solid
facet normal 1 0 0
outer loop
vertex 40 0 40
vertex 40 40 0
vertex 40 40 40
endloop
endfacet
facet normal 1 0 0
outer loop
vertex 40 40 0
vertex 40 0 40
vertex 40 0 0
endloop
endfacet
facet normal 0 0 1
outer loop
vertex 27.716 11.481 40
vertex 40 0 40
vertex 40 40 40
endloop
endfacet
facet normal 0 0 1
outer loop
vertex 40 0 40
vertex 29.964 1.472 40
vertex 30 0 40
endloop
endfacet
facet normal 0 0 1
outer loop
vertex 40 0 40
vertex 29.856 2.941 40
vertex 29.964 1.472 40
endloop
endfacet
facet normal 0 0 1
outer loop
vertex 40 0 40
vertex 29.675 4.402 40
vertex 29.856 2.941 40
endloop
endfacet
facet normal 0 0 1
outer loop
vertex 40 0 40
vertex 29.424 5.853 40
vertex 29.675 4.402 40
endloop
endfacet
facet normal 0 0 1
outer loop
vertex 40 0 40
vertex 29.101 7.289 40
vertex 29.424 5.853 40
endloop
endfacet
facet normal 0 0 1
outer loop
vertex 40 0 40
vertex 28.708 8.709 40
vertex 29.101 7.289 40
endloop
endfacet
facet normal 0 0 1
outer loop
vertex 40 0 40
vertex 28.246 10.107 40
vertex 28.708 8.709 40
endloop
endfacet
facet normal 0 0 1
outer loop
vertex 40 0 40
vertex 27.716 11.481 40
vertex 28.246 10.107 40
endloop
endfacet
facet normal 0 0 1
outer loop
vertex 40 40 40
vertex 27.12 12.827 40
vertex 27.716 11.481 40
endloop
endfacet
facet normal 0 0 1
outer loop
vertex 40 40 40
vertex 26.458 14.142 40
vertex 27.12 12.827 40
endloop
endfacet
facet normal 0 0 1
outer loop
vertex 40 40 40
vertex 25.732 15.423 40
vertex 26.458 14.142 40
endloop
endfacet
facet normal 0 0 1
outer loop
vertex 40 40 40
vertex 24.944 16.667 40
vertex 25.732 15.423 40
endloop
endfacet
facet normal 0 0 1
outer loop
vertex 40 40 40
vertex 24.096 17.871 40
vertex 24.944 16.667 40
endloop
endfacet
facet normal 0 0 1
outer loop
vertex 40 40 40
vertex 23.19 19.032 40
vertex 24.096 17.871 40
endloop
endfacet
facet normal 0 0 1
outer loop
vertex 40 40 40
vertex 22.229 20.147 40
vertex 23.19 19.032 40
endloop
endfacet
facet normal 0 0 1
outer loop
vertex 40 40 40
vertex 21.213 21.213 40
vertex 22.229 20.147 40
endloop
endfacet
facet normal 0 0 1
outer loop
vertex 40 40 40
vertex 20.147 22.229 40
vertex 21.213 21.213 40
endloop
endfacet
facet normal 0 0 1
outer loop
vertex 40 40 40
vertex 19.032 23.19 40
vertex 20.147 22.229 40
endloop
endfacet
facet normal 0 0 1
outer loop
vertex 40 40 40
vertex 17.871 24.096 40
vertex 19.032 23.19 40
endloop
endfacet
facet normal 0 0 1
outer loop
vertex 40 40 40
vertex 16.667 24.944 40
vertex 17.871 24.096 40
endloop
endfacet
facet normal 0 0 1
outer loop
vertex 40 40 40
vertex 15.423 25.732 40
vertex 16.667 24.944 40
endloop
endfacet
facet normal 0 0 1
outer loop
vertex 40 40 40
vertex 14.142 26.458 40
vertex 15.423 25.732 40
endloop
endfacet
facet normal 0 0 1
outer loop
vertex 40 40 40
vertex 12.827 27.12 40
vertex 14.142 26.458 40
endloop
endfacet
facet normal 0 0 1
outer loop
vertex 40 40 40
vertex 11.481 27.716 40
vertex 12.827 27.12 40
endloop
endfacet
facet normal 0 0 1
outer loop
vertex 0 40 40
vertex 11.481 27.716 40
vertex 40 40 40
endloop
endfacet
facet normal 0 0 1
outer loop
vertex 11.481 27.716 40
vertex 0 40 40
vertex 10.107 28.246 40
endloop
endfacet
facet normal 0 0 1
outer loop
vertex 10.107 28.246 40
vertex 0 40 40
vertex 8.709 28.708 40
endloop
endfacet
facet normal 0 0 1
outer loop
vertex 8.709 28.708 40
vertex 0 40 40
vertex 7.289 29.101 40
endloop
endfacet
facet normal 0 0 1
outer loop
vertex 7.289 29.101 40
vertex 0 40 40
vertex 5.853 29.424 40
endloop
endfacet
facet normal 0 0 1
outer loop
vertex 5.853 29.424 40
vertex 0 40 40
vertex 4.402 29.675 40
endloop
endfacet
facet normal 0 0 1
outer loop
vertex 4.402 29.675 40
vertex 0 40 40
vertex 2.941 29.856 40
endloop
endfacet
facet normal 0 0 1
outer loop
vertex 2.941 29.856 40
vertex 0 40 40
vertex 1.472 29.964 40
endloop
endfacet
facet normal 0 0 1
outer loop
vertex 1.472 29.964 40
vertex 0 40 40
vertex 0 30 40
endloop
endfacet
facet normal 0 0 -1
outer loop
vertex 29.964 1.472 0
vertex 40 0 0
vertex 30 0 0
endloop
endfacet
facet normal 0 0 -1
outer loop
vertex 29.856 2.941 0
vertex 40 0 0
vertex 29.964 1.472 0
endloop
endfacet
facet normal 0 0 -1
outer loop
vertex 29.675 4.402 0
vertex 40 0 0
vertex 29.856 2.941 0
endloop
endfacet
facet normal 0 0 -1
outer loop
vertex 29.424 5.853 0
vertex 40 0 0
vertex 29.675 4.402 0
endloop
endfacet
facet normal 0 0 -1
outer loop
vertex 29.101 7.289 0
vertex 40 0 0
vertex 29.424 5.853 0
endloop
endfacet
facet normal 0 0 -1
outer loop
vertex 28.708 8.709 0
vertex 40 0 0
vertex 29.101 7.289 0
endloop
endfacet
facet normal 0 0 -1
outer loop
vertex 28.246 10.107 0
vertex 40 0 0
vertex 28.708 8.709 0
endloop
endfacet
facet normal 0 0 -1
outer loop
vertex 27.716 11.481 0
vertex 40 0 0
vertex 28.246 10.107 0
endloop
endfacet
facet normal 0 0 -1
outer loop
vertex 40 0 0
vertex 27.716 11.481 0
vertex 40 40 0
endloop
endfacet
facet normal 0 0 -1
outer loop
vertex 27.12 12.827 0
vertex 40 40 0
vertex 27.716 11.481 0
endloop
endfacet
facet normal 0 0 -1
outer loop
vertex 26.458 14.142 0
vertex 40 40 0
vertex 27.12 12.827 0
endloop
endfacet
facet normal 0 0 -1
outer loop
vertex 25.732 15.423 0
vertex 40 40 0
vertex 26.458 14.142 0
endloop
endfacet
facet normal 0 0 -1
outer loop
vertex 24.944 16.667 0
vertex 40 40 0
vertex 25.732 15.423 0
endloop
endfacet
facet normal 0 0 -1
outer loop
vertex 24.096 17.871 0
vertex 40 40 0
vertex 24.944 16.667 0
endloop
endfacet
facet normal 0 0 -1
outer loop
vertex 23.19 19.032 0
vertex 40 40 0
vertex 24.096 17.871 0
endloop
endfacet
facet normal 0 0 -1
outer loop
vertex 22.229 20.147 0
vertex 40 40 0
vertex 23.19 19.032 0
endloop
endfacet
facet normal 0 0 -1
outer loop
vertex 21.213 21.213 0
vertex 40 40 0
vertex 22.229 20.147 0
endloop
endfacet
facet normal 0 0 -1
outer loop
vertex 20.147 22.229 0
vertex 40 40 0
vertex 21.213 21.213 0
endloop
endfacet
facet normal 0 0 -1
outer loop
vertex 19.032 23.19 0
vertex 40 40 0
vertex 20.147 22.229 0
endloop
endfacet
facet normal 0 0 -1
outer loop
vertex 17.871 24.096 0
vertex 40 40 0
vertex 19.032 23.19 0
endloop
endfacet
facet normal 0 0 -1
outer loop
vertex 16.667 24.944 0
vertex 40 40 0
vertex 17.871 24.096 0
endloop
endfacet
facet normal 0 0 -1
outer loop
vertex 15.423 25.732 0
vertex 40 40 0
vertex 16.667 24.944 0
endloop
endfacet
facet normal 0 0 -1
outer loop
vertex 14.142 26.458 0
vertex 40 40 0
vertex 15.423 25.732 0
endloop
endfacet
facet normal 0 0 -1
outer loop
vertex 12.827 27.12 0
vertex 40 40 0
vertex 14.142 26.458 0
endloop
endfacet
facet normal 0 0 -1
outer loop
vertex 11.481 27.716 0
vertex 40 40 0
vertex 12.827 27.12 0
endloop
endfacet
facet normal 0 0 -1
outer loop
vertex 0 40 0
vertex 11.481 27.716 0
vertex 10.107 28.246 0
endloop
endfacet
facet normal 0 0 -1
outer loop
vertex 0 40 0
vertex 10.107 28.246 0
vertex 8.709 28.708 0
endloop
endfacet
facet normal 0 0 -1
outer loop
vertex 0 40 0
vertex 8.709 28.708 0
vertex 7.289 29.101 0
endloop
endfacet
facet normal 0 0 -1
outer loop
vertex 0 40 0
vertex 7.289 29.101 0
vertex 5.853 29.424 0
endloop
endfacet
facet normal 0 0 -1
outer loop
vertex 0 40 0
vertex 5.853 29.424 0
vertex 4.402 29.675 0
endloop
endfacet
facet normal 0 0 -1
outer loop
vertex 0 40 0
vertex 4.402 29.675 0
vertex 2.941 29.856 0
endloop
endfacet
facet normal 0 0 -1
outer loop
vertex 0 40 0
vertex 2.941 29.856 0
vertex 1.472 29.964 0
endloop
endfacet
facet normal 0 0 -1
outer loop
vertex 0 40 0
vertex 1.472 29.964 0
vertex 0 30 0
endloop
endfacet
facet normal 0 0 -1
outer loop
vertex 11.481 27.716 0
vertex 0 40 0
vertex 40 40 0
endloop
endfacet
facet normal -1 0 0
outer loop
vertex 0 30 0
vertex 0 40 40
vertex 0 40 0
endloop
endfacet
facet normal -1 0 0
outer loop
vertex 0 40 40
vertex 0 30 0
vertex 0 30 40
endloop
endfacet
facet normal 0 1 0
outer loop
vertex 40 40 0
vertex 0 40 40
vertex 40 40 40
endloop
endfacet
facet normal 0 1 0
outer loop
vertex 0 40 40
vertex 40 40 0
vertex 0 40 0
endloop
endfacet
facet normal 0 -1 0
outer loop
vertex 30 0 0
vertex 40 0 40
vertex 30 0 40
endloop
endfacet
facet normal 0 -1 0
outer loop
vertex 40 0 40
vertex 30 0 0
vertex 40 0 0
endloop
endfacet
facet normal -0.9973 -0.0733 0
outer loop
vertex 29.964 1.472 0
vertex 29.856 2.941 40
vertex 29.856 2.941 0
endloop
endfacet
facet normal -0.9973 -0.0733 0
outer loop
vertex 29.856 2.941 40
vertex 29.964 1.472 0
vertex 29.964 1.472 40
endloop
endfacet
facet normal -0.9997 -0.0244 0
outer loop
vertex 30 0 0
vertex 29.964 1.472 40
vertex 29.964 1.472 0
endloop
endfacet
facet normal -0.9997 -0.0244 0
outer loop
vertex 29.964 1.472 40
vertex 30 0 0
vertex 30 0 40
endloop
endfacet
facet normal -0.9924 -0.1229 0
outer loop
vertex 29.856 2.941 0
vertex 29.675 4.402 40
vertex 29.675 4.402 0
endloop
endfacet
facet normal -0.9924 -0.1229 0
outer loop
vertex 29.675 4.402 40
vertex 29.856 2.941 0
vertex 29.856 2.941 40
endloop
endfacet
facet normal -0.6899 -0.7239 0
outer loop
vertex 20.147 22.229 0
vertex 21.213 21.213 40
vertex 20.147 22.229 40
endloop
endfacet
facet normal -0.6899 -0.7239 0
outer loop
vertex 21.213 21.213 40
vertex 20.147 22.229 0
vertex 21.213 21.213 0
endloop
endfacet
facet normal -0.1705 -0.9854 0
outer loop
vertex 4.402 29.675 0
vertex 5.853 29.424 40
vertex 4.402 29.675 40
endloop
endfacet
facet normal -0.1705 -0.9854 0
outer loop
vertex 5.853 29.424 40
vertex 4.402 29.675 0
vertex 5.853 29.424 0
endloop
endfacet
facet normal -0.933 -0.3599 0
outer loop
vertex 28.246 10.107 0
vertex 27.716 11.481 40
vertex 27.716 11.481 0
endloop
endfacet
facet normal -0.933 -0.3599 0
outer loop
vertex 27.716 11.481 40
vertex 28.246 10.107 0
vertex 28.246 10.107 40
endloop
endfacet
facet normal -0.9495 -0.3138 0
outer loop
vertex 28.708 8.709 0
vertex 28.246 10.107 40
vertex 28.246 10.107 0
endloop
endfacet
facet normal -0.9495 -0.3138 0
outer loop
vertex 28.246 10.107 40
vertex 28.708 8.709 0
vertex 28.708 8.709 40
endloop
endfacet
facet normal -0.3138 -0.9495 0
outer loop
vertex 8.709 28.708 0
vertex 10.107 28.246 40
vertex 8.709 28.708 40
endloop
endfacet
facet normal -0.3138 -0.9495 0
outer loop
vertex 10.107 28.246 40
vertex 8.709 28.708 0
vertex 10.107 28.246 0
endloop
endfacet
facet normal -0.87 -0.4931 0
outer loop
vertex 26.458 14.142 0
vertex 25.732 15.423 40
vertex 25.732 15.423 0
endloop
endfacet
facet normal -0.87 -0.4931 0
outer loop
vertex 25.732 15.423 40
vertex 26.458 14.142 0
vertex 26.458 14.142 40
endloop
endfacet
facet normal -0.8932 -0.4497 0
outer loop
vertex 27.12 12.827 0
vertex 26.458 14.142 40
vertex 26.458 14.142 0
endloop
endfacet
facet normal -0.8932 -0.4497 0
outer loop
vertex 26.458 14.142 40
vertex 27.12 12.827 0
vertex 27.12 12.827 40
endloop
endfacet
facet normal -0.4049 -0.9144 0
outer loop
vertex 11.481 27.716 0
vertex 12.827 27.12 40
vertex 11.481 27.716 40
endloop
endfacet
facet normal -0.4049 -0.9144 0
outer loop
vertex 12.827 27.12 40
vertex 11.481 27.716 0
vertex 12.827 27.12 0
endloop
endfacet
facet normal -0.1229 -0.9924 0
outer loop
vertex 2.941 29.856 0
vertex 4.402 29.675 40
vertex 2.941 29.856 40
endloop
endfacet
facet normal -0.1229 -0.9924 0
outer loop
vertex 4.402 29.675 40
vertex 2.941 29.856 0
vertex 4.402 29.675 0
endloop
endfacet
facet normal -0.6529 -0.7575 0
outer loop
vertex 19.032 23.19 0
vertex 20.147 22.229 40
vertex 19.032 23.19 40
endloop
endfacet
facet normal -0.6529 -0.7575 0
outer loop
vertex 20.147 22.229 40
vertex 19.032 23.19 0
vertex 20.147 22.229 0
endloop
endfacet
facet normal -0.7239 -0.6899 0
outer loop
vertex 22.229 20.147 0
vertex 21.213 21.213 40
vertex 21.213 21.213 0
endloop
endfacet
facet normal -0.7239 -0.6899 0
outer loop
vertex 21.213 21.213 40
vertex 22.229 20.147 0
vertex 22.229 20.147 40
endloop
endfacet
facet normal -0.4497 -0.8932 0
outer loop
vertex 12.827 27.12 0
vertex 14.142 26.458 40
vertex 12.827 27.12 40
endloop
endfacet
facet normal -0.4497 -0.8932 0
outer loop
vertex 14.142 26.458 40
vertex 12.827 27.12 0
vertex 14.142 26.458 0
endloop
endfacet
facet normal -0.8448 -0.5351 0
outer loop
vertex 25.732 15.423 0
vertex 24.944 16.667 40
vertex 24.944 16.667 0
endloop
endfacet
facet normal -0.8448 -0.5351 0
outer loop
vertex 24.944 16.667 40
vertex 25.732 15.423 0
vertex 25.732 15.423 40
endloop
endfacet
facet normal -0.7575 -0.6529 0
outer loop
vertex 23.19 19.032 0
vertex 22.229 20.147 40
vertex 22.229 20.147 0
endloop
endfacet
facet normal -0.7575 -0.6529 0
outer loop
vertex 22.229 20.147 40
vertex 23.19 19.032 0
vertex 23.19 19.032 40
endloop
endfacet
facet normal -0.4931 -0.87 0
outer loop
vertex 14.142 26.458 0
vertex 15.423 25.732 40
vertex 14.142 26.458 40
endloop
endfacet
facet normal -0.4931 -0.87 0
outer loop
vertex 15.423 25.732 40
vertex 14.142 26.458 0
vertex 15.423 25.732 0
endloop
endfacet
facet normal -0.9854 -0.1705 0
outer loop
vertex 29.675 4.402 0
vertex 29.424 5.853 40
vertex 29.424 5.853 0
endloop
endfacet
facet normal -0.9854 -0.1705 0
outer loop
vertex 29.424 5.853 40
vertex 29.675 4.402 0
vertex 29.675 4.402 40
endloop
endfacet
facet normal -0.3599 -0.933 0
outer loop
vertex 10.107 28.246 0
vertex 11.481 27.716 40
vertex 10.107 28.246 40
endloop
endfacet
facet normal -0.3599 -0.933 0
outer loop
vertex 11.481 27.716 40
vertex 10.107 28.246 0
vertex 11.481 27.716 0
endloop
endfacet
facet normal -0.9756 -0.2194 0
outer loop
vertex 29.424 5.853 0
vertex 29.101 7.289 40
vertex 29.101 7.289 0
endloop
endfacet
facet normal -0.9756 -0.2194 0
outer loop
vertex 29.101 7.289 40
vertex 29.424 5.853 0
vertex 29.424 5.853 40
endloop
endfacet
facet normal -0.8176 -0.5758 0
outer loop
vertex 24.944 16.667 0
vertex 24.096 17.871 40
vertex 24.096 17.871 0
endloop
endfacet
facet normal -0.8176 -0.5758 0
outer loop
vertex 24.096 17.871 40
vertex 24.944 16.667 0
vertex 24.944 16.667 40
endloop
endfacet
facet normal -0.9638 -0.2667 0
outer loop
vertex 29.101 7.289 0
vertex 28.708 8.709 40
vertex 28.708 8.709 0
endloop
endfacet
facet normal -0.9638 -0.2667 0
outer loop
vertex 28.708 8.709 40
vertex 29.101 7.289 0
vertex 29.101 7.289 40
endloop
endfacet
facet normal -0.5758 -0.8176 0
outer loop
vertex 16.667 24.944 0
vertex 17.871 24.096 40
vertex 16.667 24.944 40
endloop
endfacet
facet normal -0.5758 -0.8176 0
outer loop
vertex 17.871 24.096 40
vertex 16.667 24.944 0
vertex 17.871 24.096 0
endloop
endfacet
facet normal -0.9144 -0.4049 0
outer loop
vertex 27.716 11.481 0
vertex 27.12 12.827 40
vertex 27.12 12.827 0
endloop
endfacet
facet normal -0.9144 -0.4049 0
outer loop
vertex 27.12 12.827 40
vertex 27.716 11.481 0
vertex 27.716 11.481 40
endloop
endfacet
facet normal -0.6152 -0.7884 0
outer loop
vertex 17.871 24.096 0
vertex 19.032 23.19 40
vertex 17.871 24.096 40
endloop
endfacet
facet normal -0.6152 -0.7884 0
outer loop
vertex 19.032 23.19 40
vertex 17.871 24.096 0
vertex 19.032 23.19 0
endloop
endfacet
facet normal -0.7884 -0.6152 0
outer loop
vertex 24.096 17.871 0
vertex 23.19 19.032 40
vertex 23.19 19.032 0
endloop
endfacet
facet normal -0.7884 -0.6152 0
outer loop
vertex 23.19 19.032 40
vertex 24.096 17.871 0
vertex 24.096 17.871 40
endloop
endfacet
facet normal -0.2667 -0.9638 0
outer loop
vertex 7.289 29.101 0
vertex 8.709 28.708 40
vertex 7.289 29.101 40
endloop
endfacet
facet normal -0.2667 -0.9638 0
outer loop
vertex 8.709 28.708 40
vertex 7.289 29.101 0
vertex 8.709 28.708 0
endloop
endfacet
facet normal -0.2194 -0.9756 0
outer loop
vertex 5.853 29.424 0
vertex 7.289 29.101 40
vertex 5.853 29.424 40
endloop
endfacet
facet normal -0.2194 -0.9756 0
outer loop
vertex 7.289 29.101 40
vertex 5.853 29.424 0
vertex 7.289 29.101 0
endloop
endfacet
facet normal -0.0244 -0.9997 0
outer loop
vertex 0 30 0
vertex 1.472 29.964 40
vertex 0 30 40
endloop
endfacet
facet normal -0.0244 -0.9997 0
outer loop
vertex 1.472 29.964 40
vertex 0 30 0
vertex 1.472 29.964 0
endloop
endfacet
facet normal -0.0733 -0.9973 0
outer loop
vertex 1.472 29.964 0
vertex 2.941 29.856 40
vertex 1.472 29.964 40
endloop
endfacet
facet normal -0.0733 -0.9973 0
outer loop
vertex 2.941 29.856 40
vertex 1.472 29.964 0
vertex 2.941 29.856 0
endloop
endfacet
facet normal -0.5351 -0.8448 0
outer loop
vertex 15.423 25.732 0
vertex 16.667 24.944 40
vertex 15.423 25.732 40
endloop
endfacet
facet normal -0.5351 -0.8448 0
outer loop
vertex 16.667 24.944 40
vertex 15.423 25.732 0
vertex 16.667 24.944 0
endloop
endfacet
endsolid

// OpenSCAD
difference(){
cube(40);
translate([0,0,-5])cylinder(r=30,h=50,$fn=128);
}
